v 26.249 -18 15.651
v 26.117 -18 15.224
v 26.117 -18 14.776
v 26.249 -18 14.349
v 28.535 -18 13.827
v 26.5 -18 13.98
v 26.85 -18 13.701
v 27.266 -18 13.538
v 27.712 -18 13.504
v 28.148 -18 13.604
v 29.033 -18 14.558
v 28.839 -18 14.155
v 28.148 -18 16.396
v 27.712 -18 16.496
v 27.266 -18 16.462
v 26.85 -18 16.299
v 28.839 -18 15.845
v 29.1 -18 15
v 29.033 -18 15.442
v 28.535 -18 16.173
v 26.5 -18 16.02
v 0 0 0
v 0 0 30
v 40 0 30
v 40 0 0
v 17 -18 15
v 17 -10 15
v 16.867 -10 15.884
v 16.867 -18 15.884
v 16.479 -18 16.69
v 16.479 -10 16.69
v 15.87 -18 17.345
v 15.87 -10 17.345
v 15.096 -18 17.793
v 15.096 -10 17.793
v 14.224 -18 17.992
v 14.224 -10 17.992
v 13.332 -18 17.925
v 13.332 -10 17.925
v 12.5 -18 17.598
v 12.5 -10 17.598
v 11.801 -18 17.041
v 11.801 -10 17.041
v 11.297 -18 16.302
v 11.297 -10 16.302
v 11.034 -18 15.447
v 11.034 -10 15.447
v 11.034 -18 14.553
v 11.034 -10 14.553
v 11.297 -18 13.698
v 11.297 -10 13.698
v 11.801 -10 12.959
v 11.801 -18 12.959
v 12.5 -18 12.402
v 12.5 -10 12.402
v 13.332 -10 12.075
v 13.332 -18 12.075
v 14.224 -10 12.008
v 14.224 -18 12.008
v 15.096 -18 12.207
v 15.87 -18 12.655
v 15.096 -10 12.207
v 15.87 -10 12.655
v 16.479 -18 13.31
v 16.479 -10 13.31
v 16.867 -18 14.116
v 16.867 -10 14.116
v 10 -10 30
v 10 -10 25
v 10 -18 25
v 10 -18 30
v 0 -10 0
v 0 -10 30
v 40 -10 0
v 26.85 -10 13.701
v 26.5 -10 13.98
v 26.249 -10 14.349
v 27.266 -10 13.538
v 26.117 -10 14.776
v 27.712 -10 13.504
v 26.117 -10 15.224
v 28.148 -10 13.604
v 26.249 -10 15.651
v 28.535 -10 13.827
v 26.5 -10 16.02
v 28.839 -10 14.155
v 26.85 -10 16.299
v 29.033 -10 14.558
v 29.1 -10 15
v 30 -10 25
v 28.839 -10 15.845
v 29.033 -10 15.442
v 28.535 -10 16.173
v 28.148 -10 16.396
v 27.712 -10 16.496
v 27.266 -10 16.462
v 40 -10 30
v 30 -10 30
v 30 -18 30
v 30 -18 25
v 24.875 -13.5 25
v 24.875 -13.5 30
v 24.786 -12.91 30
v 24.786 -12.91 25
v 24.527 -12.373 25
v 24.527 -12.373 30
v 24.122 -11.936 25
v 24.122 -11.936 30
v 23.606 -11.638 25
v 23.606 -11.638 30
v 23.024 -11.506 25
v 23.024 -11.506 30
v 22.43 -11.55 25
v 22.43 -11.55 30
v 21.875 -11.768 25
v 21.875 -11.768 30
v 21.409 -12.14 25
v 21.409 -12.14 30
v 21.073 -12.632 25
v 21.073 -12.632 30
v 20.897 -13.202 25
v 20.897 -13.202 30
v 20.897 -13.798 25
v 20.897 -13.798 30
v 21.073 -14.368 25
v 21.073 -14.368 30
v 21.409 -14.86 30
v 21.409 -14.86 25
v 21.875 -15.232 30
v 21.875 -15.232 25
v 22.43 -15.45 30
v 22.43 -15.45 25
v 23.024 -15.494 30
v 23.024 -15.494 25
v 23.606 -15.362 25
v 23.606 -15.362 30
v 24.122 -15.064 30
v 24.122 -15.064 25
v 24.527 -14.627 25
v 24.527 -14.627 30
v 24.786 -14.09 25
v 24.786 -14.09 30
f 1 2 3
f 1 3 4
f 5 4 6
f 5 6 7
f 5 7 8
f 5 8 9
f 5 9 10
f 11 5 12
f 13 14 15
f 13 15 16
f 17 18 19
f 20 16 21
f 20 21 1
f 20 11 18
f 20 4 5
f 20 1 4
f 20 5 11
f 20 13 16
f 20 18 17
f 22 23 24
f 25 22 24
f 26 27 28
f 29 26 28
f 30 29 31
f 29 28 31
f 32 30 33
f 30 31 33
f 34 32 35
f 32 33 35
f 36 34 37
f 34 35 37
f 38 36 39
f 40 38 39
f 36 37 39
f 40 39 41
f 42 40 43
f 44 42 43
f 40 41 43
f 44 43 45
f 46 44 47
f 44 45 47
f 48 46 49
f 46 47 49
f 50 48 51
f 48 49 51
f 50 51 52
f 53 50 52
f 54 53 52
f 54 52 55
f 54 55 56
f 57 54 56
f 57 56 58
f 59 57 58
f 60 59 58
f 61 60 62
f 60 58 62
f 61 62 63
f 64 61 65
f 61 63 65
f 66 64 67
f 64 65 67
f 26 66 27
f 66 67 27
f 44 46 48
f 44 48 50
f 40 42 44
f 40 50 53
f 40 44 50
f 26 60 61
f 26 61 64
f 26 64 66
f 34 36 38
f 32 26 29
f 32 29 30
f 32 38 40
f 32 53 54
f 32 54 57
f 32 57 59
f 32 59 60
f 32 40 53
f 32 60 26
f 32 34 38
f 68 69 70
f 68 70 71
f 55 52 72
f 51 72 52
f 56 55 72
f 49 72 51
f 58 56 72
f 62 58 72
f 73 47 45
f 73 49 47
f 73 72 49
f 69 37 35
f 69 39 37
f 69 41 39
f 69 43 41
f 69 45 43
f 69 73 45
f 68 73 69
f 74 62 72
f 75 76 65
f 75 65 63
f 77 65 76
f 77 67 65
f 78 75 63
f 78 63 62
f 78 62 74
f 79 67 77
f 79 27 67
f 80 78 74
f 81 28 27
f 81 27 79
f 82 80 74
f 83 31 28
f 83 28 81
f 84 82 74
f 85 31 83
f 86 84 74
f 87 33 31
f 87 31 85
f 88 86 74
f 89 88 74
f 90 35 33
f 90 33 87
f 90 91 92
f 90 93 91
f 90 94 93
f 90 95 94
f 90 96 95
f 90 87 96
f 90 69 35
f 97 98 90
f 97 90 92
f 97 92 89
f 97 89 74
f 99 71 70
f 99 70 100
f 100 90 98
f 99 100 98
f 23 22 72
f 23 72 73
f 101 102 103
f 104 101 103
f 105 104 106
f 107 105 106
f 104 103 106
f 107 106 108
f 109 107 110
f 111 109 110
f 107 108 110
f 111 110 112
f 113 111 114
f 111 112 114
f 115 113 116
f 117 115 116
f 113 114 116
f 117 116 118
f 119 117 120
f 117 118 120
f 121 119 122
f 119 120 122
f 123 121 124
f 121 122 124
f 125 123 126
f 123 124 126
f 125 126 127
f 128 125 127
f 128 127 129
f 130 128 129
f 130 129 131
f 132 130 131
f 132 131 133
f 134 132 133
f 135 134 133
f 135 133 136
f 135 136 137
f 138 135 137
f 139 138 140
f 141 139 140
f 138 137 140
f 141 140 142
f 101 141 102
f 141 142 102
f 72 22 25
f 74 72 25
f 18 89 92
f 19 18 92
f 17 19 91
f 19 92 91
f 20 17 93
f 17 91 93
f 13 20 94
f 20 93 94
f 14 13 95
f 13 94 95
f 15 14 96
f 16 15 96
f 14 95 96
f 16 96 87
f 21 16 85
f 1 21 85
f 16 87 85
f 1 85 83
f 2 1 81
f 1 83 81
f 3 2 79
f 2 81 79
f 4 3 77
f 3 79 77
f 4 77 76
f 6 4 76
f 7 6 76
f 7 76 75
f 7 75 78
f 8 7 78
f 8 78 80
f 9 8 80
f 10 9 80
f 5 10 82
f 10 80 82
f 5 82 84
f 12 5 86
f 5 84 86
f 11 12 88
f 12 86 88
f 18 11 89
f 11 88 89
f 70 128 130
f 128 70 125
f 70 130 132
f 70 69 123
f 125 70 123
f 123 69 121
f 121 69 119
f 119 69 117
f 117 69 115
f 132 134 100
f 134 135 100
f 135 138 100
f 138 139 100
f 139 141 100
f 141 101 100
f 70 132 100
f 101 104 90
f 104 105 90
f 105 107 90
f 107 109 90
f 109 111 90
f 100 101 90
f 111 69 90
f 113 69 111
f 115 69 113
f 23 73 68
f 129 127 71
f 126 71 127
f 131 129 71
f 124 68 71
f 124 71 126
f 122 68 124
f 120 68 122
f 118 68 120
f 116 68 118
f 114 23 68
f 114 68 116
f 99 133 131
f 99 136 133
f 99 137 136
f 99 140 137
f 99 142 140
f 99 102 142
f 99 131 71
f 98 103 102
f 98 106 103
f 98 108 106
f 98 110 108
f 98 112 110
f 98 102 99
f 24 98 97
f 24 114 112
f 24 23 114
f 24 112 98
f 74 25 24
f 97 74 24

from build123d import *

# Parameters (mm, degrees)
F0_W     = 40
F0_H     = 30
F1_DEPTH = 10
F2_R     = 3
F2_R_2   = 1.5
F2_W     = 20
F2_H     = 5
F3_DEPTH = 8
F4_R     = 2
F5_DEPTH = 5


with BuildPart() as f1:
    # F0 (on Front) → F1 (new body)
    with BuildSketch(Plane.XZ):
        with Locations((20, 15)):
            Rectangle(F0_W, F0_H)
    extrude(amount=F1_DEPTH)

    # F2 (on face) → F3 (join)
    with BuildSketch(Plane.XZ.offset(10)):
        with Locations((14, 15)):
            Circle(F2_R)
        with Locations((27.6, 15)):
            Circle(F2_R_2)
        with Locations((20, 27.5)):
            Rectangle(F2_W, F2_H)
    extrude(amount=F3_DEPTH)

    # F4 (on face) → F5 (cut, through all)
    with BuildSketch(Plane.XY.offset(30)):
        with Locations((22.875, -13.5)):
            Circle(F4_R)
    extrude(amount=-F5_DEPTH, mode=Mode.SUBTRACT)


solid = f1.part
